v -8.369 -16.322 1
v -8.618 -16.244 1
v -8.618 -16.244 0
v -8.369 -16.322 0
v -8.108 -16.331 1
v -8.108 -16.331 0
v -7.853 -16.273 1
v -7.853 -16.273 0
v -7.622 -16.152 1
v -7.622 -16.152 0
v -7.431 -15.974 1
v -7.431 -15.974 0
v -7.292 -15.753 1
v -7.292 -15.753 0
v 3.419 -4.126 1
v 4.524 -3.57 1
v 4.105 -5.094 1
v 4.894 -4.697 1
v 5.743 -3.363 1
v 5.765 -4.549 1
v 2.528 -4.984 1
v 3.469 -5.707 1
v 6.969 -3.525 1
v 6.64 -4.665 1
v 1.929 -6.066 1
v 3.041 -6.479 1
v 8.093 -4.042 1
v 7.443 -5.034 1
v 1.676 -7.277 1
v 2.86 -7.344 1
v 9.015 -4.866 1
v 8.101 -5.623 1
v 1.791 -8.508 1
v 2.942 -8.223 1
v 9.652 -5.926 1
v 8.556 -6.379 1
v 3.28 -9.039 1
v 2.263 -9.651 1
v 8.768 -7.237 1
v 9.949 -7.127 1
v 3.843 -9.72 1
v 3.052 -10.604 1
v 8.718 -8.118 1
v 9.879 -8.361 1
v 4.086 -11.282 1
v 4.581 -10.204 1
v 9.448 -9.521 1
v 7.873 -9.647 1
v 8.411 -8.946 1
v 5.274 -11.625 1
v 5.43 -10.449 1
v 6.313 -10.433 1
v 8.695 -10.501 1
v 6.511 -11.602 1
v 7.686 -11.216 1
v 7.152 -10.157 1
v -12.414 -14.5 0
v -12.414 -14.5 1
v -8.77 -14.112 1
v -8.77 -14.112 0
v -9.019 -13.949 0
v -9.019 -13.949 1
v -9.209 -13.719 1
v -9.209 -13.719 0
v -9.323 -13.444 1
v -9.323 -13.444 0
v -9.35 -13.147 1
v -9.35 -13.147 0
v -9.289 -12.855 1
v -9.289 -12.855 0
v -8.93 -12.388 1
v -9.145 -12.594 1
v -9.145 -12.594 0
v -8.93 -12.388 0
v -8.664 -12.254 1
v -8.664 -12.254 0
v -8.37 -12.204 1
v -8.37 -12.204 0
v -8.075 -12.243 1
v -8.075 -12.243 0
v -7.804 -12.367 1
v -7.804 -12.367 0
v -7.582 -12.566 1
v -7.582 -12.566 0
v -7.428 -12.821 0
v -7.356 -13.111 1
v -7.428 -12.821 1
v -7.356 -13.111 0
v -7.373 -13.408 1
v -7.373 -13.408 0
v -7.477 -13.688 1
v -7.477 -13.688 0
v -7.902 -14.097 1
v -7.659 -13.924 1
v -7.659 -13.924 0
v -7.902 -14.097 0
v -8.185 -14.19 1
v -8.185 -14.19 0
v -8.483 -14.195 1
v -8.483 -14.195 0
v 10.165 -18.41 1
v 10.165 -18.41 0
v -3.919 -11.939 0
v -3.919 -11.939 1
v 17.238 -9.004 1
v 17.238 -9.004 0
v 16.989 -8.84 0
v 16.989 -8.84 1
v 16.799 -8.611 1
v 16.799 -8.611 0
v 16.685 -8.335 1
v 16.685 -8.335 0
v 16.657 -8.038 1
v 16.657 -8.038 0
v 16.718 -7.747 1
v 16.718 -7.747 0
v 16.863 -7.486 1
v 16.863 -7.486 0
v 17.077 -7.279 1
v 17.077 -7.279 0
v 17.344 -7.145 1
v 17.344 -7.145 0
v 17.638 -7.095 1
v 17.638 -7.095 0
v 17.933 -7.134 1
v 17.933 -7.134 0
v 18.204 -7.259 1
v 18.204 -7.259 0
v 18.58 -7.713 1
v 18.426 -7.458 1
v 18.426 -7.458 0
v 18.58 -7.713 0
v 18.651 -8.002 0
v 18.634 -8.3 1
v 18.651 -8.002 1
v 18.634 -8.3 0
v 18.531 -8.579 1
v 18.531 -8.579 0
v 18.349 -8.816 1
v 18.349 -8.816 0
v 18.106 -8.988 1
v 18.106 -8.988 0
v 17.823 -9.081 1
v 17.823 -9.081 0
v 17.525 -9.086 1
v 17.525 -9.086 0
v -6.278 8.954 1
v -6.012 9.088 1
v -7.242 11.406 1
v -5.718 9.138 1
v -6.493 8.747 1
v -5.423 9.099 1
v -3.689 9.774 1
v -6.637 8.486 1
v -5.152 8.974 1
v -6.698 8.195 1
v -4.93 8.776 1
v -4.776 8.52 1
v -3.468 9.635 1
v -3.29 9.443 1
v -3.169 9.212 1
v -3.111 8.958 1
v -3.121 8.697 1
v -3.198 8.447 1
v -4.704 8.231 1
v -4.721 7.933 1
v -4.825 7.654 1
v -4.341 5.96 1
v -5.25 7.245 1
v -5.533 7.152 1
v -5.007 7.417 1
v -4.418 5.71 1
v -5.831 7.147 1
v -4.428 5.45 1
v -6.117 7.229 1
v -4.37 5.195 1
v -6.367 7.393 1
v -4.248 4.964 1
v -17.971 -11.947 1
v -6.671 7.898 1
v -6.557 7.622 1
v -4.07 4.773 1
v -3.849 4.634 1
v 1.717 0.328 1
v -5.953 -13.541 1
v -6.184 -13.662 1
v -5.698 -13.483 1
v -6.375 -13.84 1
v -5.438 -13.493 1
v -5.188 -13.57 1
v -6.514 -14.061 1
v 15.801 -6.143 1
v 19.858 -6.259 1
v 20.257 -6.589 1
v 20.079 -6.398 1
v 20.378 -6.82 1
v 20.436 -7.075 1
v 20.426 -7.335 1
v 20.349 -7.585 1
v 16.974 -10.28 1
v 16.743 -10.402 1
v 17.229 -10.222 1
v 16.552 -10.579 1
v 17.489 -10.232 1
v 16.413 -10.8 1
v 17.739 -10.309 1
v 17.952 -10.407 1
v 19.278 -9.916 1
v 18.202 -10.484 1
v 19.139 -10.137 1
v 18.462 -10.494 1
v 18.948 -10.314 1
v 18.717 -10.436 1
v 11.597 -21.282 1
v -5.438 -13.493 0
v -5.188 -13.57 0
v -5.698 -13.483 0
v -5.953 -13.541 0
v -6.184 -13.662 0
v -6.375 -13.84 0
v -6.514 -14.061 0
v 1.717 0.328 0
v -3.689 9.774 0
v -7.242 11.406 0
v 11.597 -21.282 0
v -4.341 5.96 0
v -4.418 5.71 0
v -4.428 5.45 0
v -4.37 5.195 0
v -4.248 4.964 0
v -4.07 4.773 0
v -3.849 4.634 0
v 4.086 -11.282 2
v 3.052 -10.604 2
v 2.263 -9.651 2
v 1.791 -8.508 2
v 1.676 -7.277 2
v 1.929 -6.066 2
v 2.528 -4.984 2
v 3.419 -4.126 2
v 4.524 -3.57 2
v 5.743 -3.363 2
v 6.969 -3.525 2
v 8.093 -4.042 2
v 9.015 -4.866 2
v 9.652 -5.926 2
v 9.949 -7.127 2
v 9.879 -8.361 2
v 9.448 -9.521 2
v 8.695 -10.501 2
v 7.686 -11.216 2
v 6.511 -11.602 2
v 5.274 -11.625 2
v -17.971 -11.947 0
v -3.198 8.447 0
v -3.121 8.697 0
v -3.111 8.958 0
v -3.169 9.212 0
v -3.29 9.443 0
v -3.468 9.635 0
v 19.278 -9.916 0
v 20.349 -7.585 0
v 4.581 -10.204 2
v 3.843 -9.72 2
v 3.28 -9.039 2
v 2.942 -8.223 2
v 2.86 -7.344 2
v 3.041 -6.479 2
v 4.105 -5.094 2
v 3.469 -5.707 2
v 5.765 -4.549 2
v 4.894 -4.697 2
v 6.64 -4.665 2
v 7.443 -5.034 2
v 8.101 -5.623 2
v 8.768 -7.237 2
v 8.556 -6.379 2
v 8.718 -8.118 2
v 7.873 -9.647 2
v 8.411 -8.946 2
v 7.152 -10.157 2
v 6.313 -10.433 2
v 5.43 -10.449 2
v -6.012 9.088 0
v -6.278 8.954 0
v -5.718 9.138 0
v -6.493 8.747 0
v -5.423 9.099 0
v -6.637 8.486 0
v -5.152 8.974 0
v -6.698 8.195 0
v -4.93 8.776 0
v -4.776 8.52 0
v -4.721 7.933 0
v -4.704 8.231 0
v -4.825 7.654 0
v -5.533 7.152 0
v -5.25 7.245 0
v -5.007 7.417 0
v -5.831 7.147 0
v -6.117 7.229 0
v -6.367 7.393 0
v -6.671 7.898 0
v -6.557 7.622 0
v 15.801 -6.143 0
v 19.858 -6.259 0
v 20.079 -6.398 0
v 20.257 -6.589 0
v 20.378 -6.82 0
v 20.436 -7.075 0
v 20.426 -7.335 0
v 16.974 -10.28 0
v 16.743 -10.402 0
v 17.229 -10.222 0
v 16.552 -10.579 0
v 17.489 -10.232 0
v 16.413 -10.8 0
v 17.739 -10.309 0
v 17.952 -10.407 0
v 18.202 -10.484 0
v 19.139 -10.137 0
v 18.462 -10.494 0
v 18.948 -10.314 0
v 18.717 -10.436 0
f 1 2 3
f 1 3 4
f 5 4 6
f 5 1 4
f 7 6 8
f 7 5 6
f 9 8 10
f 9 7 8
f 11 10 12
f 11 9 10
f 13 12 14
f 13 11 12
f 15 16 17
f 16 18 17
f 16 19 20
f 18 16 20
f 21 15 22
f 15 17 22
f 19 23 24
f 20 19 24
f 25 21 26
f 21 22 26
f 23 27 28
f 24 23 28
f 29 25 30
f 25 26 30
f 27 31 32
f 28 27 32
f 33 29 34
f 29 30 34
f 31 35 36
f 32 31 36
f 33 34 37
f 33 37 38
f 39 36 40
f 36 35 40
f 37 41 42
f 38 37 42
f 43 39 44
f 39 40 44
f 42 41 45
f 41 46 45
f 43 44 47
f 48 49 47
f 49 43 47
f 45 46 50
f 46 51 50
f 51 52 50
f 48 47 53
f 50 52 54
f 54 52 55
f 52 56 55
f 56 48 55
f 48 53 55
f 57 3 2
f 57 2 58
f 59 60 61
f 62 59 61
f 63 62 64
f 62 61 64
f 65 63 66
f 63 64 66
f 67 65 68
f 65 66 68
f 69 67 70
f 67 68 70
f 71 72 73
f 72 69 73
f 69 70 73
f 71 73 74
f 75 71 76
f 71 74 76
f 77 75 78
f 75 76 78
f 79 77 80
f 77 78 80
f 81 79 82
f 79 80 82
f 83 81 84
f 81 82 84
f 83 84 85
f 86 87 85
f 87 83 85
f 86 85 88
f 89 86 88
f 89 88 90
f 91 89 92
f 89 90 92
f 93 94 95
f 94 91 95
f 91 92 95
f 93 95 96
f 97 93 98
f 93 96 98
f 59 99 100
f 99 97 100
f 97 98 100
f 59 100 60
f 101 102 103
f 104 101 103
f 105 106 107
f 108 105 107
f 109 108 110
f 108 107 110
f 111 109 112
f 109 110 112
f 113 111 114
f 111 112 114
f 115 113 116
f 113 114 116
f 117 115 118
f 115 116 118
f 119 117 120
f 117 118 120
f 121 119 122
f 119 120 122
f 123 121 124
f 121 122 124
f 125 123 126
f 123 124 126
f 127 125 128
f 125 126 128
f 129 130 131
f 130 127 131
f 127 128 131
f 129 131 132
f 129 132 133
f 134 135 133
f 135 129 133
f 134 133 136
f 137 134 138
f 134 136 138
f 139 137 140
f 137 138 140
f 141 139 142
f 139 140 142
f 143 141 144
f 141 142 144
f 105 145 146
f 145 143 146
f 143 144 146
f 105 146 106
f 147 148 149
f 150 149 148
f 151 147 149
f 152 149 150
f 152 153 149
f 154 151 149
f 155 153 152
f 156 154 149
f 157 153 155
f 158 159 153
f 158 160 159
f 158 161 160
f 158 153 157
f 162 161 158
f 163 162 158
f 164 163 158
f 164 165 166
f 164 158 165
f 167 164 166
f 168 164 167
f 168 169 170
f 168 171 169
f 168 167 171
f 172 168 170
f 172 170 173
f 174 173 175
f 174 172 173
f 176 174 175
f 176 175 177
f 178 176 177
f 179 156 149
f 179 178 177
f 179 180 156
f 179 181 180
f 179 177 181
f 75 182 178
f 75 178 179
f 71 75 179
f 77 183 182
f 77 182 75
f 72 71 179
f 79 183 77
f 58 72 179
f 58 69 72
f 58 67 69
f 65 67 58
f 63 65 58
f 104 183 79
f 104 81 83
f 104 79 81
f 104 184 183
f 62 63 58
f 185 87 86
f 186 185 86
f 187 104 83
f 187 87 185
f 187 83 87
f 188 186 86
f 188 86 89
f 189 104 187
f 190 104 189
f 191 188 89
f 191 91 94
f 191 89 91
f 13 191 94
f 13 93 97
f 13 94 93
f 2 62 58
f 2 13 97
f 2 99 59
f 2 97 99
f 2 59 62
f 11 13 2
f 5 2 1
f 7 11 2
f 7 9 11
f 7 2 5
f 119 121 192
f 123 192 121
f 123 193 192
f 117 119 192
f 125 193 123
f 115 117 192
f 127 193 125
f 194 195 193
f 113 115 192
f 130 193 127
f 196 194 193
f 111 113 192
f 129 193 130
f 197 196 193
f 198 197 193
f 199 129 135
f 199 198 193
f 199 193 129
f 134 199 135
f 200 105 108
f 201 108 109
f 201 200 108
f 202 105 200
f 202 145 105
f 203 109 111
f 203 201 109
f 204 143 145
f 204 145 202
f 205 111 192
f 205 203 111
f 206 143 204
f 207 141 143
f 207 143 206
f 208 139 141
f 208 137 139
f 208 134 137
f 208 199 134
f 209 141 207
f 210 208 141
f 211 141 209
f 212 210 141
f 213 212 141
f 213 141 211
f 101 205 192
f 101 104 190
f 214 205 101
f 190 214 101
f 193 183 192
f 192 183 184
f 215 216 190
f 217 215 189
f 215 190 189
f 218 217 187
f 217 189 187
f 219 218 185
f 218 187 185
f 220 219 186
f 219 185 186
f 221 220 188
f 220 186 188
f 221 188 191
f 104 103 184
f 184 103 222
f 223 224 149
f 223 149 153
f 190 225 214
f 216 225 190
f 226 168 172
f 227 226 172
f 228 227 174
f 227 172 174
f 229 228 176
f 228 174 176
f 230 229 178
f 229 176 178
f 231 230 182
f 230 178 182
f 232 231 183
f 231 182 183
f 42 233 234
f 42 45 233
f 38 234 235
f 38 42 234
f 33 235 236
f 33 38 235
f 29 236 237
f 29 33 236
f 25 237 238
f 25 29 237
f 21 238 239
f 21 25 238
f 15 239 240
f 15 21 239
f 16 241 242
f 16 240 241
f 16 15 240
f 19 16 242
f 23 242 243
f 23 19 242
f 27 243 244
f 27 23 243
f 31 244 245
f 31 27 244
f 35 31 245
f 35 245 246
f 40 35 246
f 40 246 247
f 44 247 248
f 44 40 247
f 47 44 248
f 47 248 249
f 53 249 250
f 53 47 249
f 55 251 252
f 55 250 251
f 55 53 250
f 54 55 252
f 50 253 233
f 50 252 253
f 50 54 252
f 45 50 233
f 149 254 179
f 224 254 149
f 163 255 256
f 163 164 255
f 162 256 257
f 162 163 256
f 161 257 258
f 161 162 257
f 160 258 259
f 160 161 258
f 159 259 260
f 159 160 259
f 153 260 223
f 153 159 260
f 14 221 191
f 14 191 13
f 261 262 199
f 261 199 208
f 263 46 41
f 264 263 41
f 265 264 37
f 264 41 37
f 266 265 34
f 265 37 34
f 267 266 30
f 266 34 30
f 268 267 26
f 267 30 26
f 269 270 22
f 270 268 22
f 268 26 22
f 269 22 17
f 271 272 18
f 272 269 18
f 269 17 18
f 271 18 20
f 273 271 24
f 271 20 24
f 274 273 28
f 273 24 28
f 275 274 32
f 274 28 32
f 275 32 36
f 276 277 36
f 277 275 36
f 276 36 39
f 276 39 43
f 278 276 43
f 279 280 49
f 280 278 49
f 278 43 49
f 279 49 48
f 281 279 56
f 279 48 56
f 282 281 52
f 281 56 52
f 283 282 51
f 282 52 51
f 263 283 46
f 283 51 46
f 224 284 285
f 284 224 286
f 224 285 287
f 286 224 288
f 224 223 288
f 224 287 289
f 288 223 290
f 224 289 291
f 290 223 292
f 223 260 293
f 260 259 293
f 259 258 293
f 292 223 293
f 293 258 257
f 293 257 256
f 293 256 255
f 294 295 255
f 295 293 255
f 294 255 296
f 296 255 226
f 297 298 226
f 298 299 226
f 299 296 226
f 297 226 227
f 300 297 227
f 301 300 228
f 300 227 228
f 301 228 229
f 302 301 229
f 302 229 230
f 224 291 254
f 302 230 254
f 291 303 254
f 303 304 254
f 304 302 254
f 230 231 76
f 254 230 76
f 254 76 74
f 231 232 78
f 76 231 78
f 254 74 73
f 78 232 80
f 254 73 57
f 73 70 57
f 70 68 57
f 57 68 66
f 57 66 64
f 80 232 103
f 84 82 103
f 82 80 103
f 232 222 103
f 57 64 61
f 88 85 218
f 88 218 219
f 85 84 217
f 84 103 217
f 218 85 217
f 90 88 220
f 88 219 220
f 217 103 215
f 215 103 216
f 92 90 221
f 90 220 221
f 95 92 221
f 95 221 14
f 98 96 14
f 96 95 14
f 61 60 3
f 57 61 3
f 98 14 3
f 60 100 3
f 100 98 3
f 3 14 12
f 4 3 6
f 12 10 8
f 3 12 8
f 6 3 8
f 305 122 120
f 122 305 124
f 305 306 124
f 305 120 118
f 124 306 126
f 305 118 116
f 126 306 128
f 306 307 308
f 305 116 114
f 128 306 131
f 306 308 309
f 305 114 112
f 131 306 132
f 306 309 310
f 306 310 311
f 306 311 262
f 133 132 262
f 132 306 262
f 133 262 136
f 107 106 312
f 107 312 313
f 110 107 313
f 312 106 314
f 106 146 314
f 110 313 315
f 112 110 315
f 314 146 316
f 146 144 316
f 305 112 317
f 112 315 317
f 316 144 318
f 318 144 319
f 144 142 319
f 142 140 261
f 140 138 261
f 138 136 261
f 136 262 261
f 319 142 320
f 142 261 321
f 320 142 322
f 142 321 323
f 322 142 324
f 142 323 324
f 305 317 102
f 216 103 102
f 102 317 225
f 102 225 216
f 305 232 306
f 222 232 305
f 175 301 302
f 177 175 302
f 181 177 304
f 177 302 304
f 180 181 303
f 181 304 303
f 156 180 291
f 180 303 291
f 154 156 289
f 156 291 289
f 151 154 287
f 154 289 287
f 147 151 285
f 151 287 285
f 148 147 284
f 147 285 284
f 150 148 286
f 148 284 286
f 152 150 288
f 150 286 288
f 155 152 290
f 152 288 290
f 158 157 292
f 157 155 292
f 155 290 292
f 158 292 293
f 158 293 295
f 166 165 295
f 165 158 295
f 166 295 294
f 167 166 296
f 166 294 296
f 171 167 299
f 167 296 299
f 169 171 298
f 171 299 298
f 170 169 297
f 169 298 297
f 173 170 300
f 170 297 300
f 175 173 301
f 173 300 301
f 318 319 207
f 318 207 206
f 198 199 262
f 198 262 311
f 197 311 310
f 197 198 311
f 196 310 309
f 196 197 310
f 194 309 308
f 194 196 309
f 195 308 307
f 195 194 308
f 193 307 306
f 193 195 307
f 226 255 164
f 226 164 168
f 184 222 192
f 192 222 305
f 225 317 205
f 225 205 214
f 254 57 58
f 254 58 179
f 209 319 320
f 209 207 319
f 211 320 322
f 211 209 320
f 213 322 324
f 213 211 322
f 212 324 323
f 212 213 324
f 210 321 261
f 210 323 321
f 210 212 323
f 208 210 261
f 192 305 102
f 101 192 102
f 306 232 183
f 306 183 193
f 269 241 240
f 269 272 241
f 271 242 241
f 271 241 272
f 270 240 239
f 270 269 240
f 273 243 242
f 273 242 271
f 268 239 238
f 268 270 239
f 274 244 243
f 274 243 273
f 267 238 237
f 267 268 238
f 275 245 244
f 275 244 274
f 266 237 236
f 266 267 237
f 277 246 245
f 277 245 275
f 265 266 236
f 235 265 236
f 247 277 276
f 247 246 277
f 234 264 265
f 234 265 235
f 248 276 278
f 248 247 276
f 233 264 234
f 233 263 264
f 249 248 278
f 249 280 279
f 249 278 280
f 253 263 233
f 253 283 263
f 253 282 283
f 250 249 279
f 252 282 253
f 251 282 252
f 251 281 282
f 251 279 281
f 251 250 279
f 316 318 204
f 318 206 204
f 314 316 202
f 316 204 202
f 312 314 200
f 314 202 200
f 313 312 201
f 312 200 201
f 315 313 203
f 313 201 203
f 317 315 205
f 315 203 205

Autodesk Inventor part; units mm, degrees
ref_plane "YZ Plane" through (0, 0, 0) normal (1, 0, 0) x (0, 1, 0)
ref_plane "XZ Plane" through (0, 0, 0) normal (0, 1, 0) x (-1, 0, 0)
ref_plane "XY Plane" through (0, 0, 0) normal (0, 0, 1) x (1, 0, 0)
ref_plane "Work Plane1" through (7.2162, 6.7561, 0) normal (0, 0, 1) x (-0.4175, -0.9087, 0)
sketch "Sketch1" plane through (7.2162, 6.7561, 0) normal (0, 0, 1) x (-0.4175, -0.9087, 0)
  circle A0 centre (9.1366, 15.6864) radius 1
  circle A1 centre (24.6366, -5.8136) radius 1
  circle A2 centre (4.1366, -12.3136) radius 1
  line L0 (21.6366, -2.3136) -> (8.1366, -2.3136)
  line L1 (8.1366, -2.3136) -> (8.1366, 13.1864)
  line L2 (8.1366, 13.1864) -> (21.6366, 13.1864)
  line L3 (21.6366, 13.1864) -> (21.6366, -2.3136)
  line L4 (11.1138, 15.6864) -> (23.6484, 15.6864)
  line L5 (23.6484, 15.6864) -> (23.6484, -3.7858)
  line L6 (23.6484, -3.7858) -> (27.5108, -3.7858)
  line L7 (27.5108, -3.7858) -> (27.5108, -8.9631)
  line L8 (27.5108, -8.9631) -> (27.5108, -15.0789)
  line L9 (27.5108, -15.0789) -> (1.8108, -15.0789)
  line L10 (1.8108, -15.0789) -> (1.8108, -10.169)
  line L11 (1.8108, -10.169) -> (6.5484, -10.169)
  line L12 (6.5484, -10.169) -> (6.5484, 17.9211)
  line L13 (6.5484, 17.9211) -> (11.1138, 17.9211)
  line L14 (11.1138, 17.9211) -> (11.1138, 15.6864)
  point P0 (9.1519, -3.7364)
  dimension "d0" = 2
  dimension "d1" = 2
  dimension "d2" = 2
  dimension "d3" = 28
  dimension "d5" = 15.5
  dimension "d6" = 5
  dimension "d7" = 21.5
  dimension "d8" = 20.5
  dimension "d9" = 2.5
  dimension "d10" = 1
  dimension "d11" = 3.5
  dimension "d12" = 3
  dimension "d13" = 33
  dimension "d14" = 25.7
  dimension "d15" = 17.1
extrude "Extrusion1" add sketch "Sketch1" along normal blind 1
fillet "Fillet1" radius 1 7 edges at (20.7666, -6.6764, 0.5) (18.8605, -10.8249, 0.5) (16.83, -9.8919, 0.5) (-6.0973, -13.1521, 0.5) (-7.7098, -16.6617, 0.5) (-2.7802, 9.3562, 0.5) (-4.7582, 5.0513, 0.5)
sketch "Sketch2" plane through (7.2162, 6.7561, 1) normal (0, 0, 1) x (-0.4175, -0.9087, 0)
  circle A0 centre (13.5484, 4.6864) radius 4.149
  circle A1 centre (13.5484, 4.6864) radius 2.9629
  arc A2 (2.8108, -10.169) -> (1.8108, -11.169) centre (2.8108, -11.169) ccw projected
  line L0 (1.8108, -11.169) -> (1.8108, -15.0789) projected
  line L1 (1.8108, -15.0789) -> (27.5108, -15.0789) projected
  line L2 (27.5108, -15.0789) -> (27.5108, -4.7858) projected
  arc A3 (27.5108, -4.7858) -> (26.5108, -3.7858) centre (26.5108, -4.7858) ccw projected
  line L3 (26.5108, -3.7858) -> (24.6484, -3.7858) projected
  arc A4 (23.6484, -2.7858) -> (24.6484, -3.7858) centre (24.6484, -2.7858) ccw projected
  line L4 (23.6484, -2.7858) -> (23.6484, 15.6864) projected
  line L5 (23.6484, 15.6864) -> (12.1138, 15.6864) projected
  arc A5 (11.1138, 16.6864) -> (12.1138, 15.6864) centre (12.1138, 16.6864) ccw projected
  line L6 (11.1138, 16.6864) -> (11.1138, 16.9211) projected
  arc A6 (11.1138, 16.9211) -> (10.1138, 17.9211) centre (10.1138, 16.9211) ccw projected
  line L7 (10.1138, 17.9211) -> (7.5484, 17.9211) projected
  arc A7 (7.5484, 17.9211) -> (6.5484, 16.9211) centre (7.5484, 16.9211) ccw projected
  line L8 (6.5484, 16.9211) -> (6.5484, -9.169) projected
  arc A8 (5.5484, -10.169) -> (6.5484, -9.169) centre (5.5484, -9.169) ccw projected
  line L9 (5.5484, -10.169) -> (2.8108, -10.169) projected
  line L10 (8.1366, -2.3136) -> (8.1366, 13.1864) projected
  line L11 (8.1366, 13.1864) -> (21.6366, 13.1864) projected
  line L12 (21.6366, 13.1864) -> (21.6366, -2.3136) projected
  line L13 (21.6366, -2.3136) -> (8.1366, -2.3136) projected
  circle A9 centre (4.1366, -12.3136) radius 1 projected
  circle A10 centre (24.6366, -5.8136) radius 1 projected
  circle A11 centre (9.1366, 15.6864) radius 1 projected
  point P0 (9.1519, -3.7364)
  dimension "d19" = 11
  dimension "d20" = 7
extrude "Extrusion2" add sketch "Sketch2" along normal blind 1 contours A0
properties part number "00_KES400_Bluray_Lens"
